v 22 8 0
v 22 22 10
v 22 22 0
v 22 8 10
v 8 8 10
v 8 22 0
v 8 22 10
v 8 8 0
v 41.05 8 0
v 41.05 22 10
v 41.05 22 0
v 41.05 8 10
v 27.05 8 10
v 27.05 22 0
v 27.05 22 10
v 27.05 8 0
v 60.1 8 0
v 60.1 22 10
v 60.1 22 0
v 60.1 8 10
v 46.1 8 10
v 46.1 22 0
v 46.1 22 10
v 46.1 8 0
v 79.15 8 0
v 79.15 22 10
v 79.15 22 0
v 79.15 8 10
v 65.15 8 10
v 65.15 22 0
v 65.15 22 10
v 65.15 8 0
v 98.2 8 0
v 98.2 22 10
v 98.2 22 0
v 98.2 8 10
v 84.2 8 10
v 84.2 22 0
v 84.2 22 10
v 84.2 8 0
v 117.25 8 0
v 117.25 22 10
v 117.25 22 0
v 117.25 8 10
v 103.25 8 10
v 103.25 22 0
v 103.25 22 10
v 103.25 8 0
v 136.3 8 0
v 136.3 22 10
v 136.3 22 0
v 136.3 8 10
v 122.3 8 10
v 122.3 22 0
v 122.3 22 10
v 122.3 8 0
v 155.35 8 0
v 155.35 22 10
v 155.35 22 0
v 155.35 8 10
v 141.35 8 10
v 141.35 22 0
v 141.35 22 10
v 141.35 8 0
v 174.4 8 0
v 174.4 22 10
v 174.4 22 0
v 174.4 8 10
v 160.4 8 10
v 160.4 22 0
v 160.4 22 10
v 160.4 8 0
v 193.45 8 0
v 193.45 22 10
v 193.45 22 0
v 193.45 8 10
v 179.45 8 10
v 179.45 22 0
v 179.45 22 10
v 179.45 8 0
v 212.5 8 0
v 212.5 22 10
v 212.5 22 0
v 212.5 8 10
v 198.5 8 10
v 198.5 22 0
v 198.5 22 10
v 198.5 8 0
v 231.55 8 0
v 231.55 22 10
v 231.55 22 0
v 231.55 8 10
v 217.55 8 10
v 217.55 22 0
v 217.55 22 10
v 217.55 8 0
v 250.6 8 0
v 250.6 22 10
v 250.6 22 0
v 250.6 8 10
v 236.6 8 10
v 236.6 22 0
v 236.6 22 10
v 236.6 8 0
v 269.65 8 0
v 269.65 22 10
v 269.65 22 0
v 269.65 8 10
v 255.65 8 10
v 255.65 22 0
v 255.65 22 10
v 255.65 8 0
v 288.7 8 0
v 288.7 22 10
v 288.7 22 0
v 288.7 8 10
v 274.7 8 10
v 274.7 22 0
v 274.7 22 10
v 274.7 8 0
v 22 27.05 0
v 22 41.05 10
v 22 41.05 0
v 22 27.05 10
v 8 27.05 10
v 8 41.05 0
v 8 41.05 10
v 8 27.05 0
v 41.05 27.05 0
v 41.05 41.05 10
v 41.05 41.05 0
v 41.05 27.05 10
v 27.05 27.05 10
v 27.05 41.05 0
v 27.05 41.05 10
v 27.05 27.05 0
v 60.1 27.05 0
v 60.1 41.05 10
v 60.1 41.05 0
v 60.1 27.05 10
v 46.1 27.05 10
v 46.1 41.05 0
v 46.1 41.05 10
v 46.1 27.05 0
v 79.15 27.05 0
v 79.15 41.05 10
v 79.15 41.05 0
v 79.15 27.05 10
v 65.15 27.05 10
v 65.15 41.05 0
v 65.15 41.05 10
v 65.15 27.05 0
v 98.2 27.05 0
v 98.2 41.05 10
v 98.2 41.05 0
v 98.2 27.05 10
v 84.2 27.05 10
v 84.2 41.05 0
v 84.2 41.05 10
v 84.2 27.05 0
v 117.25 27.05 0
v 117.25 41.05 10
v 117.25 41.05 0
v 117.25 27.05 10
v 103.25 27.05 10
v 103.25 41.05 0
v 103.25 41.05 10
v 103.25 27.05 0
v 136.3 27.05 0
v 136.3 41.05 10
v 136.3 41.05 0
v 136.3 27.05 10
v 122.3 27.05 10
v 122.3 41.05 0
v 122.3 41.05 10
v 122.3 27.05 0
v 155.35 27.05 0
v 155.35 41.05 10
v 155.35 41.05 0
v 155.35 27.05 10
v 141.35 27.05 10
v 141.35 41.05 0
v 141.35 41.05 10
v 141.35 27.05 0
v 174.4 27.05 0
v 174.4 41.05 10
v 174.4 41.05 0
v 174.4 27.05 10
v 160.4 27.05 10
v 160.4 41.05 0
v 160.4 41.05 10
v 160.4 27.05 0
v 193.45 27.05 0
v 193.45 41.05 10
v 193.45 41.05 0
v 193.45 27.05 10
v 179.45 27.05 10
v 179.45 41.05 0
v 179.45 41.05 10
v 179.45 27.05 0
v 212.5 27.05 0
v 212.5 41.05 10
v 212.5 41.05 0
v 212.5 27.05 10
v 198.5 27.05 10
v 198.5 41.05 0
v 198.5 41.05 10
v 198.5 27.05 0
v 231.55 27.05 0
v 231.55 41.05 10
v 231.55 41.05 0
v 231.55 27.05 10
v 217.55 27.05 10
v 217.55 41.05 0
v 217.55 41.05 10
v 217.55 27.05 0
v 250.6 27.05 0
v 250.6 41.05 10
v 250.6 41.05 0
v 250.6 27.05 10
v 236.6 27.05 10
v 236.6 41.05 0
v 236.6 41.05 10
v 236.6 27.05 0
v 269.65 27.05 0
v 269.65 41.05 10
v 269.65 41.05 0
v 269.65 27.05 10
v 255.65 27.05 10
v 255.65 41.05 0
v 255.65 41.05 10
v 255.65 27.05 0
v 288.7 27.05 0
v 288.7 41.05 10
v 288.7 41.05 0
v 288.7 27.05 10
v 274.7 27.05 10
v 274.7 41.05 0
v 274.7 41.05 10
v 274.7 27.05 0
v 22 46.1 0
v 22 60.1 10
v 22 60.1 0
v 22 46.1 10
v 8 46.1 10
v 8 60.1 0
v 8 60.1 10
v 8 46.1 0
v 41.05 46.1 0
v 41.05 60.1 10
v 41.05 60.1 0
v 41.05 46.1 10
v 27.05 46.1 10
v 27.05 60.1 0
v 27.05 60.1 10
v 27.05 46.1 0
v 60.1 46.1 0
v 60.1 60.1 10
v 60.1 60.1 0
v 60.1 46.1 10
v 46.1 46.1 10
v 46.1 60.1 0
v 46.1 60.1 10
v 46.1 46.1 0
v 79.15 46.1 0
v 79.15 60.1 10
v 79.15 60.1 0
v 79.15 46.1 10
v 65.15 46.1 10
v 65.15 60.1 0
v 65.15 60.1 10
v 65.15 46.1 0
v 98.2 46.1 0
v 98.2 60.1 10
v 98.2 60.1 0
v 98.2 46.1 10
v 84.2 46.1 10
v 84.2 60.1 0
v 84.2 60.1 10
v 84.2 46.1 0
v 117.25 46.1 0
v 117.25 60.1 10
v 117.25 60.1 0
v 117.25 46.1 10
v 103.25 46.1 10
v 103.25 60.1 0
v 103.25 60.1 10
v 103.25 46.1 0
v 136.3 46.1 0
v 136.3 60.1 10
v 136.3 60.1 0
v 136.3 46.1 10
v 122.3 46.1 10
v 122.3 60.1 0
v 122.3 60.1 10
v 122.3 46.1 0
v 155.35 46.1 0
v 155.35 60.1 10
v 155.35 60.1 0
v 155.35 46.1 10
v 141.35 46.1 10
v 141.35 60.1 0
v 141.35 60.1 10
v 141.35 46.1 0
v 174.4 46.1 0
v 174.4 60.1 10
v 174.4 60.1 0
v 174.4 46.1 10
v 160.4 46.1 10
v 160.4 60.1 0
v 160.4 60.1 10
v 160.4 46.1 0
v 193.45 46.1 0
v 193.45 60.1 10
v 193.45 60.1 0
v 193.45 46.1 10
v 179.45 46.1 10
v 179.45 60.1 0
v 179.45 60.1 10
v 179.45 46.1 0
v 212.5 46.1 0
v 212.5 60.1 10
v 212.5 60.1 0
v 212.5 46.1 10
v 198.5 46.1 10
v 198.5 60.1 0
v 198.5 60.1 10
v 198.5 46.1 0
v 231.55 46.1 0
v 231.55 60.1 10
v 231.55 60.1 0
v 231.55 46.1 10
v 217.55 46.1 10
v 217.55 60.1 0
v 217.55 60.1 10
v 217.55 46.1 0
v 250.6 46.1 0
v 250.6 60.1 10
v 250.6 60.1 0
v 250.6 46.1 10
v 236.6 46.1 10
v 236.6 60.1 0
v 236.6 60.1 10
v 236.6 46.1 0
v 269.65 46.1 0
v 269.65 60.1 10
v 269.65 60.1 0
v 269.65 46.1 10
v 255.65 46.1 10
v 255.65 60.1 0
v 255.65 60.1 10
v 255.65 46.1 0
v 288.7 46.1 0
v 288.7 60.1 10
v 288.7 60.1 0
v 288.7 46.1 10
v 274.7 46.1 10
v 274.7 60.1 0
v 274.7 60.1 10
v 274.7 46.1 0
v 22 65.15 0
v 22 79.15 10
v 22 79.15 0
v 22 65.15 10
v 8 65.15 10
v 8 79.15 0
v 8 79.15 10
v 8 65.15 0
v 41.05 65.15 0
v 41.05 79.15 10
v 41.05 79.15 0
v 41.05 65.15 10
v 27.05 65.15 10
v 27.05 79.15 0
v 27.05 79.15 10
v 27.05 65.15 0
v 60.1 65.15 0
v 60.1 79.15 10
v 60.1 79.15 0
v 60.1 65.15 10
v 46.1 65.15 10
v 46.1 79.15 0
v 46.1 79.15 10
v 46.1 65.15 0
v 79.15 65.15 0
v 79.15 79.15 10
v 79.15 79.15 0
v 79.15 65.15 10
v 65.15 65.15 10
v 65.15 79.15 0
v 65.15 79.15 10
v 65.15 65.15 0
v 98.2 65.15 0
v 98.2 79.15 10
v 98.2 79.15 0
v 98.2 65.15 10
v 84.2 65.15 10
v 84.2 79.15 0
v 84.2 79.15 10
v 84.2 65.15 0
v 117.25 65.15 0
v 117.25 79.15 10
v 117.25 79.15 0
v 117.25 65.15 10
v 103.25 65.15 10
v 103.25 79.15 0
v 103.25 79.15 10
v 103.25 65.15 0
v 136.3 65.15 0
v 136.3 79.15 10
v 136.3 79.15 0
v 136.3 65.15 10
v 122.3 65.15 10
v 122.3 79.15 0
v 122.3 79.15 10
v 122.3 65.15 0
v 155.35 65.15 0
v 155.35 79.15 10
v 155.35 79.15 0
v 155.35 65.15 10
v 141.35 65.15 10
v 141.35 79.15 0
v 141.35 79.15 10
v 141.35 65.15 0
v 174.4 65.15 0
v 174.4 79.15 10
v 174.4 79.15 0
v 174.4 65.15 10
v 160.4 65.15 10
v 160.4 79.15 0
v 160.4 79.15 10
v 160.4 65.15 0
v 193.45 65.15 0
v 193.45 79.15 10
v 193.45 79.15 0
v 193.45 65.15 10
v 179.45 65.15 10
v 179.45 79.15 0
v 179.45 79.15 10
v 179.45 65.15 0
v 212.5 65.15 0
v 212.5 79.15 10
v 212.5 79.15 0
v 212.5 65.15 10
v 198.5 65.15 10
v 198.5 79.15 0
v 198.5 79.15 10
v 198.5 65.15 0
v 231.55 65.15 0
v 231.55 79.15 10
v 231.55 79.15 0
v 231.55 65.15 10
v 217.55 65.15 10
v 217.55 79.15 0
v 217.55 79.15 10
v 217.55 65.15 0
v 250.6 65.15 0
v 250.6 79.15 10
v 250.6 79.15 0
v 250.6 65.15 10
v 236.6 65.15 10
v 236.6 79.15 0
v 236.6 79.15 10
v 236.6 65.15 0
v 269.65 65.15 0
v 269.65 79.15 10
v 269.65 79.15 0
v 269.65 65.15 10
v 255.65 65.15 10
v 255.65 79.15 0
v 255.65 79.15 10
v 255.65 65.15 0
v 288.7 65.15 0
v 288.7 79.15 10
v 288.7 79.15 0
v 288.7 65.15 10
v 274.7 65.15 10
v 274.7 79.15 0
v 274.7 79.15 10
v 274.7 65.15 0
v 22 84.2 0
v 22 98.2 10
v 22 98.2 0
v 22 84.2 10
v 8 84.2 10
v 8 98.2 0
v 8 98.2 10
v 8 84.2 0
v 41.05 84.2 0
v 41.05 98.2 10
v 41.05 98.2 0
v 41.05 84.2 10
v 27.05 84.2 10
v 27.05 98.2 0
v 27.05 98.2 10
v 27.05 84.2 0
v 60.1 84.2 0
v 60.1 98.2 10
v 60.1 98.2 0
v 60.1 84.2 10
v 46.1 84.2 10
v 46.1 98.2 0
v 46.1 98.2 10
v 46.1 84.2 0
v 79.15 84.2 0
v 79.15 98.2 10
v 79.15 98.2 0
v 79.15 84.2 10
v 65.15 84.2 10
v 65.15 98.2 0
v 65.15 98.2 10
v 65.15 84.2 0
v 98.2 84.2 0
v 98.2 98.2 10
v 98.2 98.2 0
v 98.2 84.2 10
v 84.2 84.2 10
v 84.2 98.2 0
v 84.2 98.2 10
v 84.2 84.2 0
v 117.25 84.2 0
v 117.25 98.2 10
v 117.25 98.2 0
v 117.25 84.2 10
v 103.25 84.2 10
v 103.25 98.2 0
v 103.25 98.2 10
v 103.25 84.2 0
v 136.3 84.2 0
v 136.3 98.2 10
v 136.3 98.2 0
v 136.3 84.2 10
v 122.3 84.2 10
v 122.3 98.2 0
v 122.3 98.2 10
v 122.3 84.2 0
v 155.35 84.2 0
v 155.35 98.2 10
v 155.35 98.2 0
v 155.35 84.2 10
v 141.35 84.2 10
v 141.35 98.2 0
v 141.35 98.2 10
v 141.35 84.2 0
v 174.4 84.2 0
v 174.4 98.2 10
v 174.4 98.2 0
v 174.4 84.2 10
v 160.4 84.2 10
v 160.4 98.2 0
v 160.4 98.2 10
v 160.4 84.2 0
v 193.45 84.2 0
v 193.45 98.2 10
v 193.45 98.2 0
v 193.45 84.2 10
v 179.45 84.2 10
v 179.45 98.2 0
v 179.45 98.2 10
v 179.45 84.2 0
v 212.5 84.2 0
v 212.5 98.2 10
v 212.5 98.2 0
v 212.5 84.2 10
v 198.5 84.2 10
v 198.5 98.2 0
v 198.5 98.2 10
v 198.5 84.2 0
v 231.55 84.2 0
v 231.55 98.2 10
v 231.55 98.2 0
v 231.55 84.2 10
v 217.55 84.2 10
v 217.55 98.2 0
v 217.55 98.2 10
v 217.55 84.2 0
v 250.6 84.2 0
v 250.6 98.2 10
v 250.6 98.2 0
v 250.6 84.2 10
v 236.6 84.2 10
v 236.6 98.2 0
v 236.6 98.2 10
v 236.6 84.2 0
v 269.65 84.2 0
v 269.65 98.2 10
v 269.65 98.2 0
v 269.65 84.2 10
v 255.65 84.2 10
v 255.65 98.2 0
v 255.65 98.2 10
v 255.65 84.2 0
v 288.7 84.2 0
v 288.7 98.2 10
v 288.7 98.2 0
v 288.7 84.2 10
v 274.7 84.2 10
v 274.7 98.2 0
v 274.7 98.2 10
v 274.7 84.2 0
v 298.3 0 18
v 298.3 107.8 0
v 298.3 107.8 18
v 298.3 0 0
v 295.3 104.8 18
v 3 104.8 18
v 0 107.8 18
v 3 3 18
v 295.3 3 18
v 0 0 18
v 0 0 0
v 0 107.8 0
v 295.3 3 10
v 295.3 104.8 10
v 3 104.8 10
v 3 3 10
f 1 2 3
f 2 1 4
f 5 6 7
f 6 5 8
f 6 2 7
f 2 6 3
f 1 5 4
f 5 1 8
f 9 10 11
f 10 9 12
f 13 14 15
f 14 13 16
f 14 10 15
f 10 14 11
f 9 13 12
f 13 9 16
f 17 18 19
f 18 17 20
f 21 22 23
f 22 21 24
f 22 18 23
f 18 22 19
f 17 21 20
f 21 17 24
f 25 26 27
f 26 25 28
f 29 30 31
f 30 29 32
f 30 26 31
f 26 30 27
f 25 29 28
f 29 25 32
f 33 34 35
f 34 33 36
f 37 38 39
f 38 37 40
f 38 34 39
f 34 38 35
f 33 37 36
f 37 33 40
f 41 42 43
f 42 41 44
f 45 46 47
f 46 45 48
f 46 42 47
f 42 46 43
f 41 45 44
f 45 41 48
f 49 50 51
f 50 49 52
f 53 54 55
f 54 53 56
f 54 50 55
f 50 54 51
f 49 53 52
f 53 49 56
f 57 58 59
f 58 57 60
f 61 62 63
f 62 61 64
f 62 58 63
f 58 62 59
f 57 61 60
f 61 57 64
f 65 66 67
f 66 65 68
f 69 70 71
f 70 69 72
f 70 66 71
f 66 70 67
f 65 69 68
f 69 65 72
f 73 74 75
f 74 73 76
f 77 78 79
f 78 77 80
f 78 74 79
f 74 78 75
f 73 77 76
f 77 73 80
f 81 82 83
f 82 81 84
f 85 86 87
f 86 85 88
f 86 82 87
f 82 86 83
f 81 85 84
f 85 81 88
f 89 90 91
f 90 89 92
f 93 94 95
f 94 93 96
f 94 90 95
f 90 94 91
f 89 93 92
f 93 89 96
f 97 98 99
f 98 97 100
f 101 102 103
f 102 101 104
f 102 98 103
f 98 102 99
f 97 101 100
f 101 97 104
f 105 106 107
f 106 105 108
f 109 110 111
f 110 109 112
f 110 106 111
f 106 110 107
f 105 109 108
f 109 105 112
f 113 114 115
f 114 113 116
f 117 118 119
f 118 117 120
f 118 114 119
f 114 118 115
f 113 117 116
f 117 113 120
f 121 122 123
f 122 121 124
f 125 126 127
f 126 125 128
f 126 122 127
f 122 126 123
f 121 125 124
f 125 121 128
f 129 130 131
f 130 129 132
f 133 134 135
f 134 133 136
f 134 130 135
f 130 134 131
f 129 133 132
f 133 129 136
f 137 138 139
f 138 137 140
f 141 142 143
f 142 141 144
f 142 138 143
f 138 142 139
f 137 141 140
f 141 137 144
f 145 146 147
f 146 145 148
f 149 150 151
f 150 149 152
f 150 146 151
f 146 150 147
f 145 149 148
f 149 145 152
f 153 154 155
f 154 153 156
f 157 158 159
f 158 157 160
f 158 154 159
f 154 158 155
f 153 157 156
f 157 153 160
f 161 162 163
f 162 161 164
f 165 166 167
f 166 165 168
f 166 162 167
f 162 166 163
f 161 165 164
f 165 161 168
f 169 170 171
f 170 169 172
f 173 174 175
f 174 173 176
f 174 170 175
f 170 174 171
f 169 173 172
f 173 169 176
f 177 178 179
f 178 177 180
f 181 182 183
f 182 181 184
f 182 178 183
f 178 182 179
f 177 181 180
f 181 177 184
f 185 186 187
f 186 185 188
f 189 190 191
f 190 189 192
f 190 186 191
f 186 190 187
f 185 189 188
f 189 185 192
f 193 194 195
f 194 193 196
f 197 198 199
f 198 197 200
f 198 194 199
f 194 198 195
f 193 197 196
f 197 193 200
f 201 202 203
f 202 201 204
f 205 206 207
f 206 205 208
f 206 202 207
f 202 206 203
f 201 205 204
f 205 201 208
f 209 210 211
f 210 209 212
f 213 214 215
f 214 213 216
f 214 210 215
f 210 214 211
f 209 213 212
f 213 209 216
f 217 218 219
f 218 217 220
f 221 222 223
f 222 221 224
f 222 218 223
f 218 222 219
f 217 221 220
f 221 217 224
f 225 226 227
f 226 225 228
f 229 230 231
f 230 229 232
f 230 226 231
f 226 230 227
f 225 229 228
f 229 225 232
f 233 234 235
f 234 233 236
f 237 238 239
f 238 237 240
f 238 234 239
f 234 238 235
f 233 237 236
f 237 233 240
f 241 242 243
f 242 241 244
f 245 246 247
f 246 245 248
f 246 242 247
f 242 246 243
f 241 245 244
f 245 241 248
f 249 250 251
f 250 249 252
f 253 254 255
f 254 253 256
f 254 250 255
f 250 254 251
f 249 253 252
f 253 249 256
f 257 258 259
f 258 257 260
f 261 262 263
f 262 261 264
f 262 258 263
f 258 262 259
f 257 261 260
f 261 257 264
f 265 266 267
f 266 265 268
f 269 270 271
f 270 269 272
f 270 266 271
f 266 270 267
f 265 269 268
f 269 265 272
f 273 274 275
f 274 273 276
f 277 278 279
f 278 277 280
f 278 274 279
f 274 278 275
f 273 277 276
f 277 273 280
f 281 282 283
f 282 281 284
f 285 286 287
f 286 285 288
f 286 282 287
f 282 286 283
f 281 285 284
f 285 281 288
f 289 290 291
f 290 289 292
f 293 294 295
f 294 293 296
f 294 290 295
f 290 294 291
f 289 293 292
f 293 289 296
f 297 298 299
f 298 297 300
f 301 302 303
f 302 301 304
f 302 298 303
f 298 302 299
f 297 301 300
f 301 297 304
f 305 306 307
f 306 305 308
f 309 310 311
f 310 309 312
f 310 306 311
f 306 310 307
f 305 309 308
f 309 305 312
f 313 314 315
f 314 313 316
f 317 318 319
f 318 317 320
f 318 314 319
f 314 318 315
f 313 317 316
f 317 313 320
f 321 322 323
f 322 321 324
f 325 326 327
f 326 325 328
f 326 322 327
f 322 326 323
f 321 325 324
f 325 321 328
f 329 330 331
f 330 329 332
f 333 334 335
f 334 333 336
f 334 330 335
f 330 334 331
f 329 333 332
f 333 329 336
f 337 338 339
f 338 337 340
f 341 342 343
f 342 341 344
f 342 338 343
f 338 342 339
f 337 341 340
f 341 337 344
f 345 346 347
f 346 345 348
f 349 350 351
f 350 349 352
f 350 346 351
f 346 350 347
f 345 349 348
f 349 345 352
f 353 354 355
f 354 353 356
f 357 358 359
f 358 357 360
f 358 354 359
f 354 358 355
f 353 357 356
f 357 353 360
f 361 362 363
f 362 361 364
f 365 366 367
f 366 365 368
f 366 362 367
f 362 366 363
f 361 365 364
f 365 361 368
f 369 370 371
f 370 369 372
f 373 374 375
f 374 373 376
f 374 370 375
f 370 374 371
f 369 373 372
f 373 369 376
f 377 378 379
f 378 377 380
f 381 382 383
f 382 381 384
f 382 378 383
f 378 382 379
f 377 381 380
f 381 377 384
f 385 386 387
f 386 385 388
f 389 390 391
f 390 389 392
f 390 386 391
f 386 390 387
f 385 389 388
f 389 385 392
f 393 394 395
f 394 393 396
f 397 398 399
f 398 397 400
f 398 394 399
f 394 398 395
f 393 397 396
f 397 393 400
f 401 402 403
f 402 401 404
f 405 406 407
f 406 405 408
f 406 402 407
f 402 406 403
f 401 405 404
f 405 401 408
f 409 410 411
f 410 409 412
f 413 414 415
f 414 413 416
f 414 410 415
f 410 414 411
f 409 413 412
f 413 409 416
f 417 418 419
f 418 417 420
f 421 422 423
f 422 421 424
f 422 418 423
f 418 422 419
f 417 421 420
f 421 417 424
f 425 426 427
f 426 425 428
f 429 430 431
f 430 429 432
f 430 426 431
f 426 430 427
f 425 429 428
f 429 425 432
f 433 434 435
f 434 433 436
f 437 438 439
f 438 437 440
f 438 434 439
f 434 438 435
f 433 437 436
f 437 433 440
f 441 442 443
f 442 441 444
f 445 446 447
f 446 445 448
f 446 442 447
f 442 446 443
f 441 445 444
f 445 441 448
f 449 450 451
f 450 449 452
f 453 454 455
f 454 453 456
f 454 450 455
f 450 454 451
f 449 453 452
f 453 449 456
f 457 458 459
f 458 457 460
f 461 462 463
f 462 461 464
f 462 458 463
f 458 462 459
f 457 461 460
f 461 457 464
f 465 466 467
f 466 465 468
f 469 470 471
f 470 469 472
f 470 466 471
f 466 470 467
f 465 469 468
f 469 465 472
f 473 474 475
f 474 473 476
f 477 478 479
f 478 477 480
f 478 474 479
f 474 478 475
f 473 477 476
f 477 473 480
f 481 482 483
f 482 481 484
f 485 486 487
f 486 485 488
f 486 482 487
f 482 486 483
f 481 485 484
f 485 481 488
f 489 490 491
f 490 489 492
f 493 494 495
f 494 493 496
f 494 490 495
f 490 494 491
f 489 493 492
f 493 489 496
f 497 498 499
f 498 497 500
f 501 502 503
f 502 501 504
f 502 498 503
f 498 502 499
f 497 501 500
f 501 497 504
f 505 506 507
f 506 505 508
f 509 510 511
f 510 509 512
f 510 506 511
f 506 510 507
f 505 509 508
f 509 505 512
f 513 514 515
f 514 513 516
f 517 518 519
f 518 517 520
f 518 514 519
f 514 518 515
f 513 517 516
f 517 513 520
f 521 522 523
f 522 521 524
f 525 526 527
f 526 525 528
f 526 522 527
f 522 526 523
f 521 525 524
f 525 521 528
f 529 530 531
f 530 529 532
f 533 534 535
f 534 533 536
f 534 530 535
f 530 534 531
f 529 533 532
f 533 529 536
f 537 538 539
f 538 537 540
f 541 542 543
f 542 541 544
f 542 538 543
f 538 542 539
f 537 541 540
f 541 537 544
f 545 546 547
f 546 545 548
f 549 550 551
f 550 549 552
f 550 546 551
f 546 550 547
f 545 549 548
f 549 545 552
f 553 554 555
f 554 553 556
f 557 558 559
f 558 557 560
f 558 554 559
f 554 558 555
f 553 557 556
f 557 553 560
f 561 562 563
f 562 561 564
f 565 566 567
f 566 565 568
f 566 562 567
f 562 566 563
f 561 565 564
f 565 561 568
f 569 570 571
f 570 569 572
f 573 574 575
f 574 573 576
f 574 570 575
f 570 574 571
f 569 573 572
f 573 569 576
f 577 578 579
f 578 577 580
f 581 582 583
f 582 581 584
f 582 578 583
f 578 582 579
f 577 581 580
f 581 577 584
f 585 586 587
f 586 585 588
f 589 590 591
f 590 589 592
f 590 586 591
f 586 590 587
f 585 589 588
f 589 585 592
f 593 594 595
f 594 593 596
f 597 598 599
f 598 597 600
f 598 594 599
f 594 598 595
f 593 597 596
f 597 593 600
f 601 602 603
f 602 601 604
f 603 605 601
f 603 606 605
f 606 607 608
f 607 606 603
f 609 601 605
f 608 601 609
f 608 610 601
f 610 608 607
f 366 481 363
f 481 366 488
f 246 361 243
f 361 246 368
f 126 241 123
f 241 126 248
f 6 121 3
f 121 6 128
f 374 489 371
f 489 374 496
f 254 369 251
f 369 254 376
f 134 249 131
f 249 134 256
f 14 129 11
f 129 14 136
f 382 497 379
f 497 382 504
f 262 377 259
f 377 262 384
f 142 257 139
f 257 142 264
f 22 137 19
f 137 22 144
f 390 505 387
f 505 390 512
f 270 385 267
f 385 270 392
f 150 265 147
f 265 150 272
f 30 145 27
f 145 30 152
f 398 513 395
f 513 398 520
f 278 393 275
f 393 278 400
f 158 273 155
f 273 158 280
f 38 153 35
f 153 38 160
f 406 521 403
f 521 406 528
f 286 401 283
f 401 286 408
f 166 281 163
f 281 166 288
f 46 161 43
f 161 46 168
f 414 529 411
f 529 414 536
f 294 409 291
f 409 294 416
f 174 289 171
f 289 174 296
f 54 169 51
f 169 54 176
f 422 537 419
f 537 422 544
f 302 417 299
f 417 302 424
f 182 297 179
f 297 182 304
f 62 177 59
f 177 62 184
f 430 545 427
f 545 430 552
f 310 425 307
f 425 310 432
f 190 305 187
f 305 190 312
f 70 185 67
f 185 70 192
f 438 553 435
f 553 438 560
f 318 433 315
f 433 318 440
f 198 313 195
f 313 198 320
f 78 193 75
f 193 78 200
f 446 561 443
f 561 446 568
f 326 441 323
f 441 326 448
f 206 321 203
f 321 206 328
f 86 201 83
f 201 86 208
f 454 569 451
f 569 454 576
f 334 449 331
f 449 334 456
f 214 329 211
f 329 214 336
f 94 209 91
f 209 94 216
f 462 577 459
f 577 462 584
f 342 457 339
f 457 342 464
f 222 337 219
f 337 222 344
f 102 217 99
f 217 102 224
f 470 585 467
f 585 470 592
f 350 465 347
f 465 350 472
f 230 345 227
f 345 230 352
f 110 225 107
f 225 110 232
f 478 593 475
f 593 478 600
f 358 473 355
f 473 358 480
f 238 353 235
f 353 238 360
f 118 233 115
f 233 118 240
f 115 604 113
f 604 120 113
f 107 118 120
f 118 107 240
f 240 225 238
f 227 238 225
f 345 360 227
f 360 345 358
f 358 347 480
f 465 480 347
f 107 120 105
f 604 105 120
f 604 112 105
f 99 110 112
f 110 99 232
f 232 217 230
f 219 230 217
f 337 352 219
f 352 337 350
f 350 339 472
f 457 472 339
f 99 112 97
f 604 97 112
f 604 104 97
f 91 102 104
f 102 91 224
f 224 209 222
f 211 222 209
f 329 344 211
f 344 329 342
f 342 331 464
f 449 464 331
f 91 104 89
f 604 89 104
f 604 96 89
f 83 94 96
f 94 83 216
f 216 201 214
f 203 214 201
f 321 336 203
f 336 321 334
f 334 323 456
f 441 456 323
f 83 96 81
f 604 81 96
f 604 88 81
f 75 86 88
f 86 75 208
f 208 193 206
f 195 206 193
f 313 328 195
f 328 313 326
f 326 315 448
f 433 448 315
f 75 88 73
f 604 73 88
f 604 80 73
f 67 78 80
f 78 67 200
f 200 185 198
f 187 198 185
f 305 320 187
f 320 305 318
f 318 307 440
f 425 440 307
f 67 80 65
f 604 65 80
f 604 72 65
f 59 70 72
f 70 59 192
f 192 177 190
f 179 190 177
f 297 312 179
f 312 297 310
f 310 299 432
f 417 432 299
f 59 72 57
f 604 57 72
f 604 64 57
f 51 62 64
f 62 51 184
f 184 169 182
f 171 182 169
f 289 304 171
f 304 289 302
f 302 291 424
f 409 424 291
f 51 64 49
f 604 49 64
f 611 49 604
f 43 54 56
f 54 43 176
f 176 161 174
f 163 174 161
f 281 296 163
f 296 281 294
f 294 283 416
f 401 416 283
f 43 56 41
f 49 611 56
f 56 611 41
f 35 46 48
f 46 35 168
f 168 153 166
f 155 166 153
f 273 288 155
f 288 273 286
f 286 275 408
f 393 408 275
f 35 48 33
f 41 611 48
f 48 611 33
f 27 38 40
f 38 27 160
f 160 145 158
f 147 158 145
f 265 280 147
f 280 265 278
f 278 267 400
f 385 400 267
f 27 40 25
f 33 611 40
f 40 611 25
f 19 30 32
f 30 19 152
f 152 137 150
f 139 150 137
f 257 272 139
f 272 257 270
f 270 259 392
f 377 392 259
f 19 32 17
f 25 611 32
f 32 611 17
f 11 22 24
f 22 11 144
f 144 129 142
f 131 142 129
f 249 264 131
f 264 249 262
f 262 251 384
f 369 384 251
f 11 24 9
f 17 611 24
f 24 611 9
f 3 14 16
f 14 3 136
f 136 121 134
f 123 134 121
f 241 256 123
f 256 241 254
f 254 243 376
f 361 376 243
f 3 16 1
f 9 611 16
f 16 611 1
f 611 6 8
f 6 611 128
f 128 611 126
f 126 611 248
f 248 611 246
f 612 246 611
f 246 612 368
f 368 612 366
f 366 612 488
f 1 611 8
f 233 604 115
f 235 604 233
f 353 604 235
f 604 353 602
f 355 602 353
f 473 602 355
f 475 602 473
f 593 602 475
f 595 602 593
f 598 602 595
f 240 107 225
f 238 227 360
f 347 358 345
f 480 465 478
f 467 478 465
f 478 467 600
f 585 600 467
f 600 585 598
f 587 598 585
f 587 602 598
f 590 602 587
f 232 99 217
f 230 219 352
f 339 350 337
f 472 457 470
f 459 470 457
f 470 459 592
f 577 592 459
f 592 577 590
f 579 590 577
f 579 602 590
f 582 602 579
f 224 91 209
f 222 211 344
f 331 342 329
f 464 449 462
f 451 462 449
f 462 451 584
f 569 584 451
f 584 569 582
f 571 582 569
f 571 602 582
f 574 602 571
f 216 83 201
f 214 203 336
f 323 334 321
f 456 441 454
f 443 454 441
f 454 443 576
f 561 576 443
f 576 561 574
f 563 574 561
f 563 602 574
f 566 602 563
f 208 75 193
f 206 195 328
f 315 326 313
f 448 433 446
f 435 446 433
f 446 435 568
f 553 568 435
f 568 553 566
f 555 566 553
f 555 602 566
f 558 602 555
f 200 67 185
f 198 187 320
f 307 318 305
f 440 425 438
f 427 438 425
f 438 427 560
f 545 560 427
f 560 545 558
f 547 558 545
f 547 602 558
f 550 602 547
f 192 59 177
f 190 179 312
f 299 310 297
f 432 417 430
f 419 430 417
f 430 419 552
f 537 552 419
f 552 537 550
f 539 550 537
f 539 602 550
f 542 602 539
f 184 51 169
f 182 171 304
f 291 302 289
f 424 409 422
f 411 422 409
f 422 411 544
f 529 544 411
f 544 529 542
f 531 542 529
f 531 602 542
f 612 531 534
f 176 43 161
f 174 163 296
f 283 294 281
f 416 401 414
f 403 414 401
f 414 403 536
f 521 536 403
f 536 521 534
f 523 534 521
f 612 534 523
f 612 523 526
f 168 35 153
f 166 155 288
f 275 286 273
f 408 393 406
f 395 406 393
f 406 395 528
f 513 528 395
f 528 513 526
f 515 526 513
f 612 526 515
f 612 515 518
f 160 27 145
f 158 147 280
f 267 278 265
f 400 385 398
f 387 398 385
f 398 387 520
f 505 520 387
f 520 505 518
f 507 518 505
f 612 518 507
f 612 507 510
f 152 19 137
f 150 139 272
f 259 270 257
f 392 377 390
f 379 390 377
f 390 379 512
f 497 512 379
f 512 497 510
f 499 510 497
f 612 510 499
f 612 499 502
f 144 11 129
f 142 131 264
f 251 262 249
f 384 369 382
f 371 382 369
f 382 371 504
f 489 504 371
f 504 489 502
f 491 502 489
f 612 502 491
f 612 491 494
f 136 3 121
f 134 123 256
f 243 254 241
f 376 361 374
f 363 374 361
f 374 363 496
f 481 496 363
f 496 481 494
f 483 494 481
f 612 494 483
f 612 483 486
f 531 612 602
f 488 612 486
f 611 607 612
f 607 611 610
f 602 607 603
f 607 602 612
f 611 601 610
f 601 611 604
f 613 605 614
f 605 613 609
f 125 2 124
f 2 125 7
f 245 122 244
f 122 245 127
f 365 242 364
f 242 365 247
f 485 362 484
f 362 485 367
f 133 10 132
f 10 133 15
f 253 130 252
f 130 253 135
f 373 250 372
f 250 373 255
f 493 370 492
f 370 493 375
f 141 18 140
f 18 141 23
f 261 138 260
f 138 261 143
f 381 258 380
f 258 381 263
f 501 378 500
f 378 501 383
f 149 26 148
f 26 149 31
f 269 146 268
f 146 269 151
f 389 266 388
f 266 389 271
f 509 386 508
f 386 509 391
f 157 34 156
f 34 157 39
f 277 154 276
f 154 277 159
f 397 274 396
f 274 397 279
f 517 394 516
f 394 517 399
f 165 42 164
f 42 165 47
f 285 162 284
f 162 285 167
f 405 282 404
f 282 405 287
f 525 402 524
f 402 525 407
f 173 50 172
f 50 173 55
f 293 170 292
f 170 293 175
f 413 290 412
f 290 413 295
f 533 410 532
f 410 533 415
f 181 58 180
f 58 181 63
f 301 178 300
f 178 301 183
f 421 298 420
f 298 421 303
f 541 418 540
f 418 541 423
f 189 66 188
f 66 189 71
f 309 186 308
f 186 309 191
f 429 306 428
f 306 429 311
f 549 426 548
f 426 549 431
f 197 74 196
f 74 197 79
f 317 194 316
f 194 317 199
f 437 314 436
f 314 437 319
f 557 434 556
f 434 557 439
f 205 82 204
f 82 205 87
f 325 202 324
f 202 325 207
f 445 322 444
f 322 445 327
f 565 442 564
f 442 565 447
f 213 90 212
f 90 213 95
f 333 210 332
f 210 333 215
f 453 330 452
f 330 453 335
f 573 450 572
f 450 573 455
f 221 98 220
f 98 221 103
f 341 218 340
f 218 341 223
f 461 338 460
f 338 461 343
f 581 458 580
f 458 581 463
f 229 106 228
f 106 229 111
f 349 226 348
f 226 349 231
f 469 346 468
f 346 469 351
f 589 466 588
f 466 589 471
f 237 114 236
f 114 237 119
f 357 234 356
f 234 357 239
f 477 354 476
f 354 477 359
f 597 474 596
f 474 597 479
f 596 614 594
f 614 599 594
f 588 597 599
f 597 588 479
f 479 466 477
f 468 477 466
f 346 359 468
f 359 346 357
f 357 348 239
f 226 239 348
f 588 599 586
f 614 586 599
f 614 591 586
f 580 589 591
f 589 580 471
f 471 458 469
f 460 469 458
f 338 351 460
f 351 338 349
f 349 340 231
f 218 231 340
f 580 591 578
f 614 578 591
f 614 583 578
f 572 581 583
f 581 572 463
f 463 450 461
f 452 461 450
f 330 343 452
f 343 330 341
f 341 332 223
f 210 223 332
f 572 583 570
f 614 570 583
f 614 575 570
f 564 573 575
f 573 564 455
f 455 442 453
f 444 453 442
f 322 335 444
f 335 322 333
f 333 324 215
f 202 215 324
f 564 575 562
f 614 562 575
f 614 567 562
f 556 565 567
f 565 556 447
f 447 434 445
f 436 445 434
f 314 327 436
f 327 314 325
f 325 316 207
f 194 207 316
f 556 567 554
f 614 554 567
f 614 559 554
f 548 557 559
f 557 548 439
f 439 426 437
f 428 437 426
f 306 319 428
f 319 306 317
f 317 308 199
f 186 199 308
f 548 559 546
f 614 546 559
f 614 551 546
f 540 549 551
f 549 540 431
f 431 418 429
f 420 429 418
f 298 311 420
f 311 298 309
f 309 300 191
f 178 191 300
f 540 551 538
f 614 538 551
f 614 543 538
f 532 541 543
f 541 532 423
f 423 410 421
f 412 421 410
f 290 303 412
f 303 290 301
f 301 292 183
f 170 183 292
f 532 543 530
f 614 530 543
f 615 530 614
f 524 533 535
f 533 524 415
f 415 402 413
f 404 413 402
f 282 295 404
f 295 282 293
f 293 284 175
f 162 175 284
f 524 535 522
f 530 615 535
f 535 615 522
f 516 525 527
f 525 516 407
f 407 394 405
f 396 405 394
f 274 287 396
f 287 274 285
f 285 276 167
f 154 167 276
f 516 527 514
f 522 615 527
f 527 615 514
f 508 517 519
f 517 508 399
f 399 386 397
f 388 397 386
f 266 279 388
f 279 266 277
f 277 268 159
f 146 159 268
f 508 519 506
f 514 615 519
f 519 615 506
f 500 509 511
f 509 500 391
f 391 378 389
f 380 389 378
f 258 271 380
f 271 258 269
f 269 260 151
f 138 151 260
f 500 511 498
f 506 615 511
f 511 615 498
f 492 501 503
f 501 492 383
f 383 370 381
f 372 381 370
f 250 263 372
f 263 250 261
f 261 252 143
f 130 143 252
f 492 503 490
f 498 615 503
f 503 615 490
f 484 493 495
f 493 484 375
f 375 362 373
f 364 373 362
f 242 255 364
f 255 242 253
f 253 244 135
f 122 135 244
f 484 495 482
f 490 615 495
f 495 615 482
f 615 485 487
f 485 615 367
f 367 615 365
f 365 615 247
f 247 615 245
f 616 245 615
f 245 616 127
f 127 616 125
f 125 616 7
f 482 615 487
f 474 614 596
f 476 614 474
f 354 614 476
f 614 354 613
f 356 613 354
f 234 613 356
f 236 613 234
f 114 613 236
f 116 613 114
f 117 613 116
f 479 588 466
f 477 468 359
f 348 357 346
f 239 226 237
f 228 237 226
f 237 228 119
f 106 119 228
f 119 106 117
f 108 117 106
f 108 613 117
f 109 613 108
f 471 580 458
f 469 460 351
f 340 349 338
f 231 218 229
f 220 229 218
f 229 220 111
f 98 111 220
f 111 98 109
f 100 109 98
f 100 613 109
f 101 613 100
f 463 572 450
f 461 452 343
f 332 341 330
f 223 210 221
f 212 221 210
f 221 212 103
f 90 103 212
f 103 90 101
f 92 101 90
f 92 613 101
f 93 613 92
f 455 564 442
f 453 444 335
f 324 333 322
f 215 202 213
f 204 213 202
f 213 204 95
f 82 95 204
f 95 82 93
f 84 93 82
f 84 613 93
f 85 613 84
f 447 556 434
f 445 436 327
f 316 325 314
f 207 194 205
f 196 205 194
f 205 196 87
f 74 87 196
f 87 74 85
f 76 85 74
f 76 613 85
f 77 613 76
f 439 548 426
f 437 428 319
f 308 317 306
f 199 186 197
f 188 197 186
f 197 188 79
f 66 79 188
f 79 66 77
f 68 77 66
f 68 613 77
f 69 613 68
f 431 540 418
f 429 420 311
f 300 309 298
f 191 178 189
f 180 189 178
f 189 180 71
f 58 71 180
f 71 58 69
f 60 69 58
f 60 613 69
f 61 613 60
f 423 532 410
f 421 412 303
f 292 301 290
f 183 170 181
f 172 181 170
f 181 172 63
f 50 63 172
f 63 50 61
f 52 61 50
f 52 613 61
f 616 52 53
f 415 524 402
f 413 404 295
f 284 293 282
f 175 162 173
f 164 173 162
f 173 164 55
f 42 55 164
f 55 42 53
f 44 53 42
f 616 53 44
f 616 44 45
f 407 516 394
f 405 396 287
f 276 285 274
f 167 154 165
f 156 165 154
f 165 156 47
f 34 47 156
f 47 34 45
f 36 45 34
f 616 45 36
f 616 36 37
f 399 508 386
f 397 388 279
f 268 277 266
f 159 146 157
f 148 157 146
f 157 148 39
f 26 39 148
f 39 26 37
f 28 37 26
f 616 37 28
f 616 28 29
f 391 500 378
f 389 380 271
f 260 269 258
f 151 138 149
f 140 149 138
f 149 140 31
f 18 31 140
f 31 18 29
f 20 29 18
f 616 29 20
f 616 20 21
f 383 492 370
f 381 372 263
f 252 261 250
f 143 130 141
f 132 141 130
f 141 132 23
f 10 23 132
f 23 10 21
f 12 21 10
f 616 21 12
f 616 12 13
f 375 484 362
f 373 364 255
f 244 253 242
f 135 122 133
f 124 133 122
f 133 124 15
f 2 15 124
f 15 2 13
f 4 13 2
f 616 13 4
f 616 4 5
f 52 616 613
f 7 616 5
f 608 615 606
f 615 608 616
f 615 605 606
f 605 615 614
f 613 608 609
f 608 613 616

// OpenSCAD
// Generated keyboard case
// Layout: 5x15
// Switch type: Cherry MX
// Optimization: render

// Parameters
case_width = 298.30;
case_height = 107.80;
case_depth = 18.00;
wall_thickness = 3.00;
base_height = 10.00;
switch_cutout_size = 14.00;
key_spacing = 19.05;

module keyboard_case() {
    difference() {
        // Outer shell
        translate([0, 0, 0])
            cube([case_width, case_height, case_depth]);

        // Inner cavity
        translate([wall_thickness, wall_thickness, base_height])
            cube([case_width - 2*wall_thickness, 
                  case_height - 2*wall_thickness, 
                  case_depth - base_height + 1]);

        // Switch cutouts
        translate([wall_thickness + 5 - 0.00, wall_thickness + 5 - 0.00, -1])
            render() switch_plate();
    }
}

module switch_plate() {
    translate([0.00, 0.00, 0])
        cube([switch_cutout_size, switch_cutout_size, base_height + 2]);
    translate([19.05, 0.00, 0])
        cube([switch_cutout_size, switch_cutout_size, base_height + 2]);
    translate([38.10, 0.00, 0])
        cube([switch_cutout_size, switch_cutout_size, base_height + 2]);
    translate([57.15, 0.00, 0])
        cube([switch_cutout_size, switch_cutout_size, base_height + 2]);
    translate([76.20, 0.00, 0])
        cube([switch_cutout_size, switch_cutout_size, base_height + 2]);
    translate([95.25, 0.00, 0])
        cube([switch_cutout_size, switch_cutout_size, base_height + 2]);
    translate([114.30, 0.00, 0])
        cube([switch_cutout_size, switch_cutout_size, base_height + 2]);
    translate([133.35, 0.00, 0])
        cube([switch_cutout_size, switch_cutout_size, base_height + 2]);
    translate([152.40, 0.00, 0])
        cube([switch_cutout_size, switch_cutout_size, base_height + 2]);
    translate([171.45, 0.00, 0])
        cube([switch_cutout_size, switch_cutout_size, base_height + 2]);
    translate([190.50, 0.00, 0])
        cube([switch_cutout_size, switch_cutout_size, base_height + 2]);
    translate([209.55, 0.00, 0])
        cube([switch_cutout_size, switch_cutout_size, base_height + 2]);
    translate([228.60, 0.00, 0])
        cube([switch_cutout_size, switch_cutout_size, base_height + 2]);
    translate([247.65, 0.00, 0])
        cube([switch_cutout_size, switch_cutout_size, base_height + 2]);
    translate([266.70, 0.00, 0])
        cube([switch_cutout_size, switch_cutout_size, base_height + 2]);
    translate([0.00, 19.05, 0])
        cube([switch_cutout_size, switch_cutout_size, base_height + 2]);
    translate([19.05, 19.05, 0])
        cube([switch_cutout_size, switch_cutout_size, base_height + 2]);
    translate([38.10, 19.05, 0])
        cube([switch_cutout_size, switch_cutout_size, base_height + 2]);
    translate([57.15, 19.05, 0])
        cube([switch_cutout_size, switch_cutout_size, base_height + 2]);
    translate([76.20, 19.05, 0])
        cube([switch_cutout_size, switch_cutout_size, base_height + 2]);
    translate([95.25, 19.05, 0])
        cube([switch_cutout_size, switch_cutout_size, base_height + 2]);
    translate([114.30, 19.05, 0])
        cube([switch_cutout_size, switch_cutout_size, base_height + 2]);
    translate([133.35, 19.05, 0])
        cube([switch_cutout_size, switch_cutout_size, base_height + 2]);
    translate([152.40, 19.05, 0])
        cube([switch_cutout_size, switch_cutout_size, base_height + 2]);
    translate([171.45, 19.05, 0])
        cube([switch_cutout_size, switch_cutout_size, base_height + 2]);
    translate([190.50, 19.05, 0])
        cube([switch_cutout_size, switch_cutout_size, base_height + 2]);
    translate([209.55, 19.05, 0])
        cube([switch_cutout_size, switch_cutout_size, base_height + 2]);
    translate([228.60, 19.05, 0])
        cube([switch_cutout_size, switch_cutout_size, base_height + 2]);
    translate([247.65, 19.05, 0])
        cube([switch_cutout_size, switch_cutout_size, base_height + 2]);
    translate([266.70, 19.05, 0])
        cube([switch_cutout_size, switch_cutout_size, base_height + 2]);
    translate([0.00, 38.10, 0])
        cube([switch_cutout_size, switch_cutout_size, base_height + 2]);
    translate([19.05, 38.10, 0])
        cube([switch_cutout_size, switch_cutout_size, base_height + 2]);
    translate([38.10, 38.10, 0])
        cube([switch_cutout_size, switch_cutout_size, base_height + 2]);
    translate([57.15, 38.10, 0])
        cube([switch_cutout_size, switch_cutout_size, base_height + 2]);
    translate([76.20, 38.10, 0])
        cube([switch_cutout_size, switch_cutout_size, base_height + 2]);
    translate([95.25, 38.10, 0])
        cube([switch_cutout_size, switch_cutout_size, base_height + 2]);
    translate([114.30, 38.10, 0])
        cube([switch_cutout_size, switch_cutout_size, base_height + 2]);
    translate([133.35, 38.10, 0])
        cube([switch_cutout_size, switch_cutout_size, base_height + 2]);
    translate([152.40, 38.10, 0])
        cube([switch_cutout_size, switch_cutout_size, base_height + 2]);
    translate([171.45, 38.10, 0])
        cube([switch_cutout_size, switch_cutout_size, base_height + 2]);
    translate([190.50, 38.10, 0])
        cube([switch_cutout_size, switch_cutout_size, base_height + 2]);
    translate([209.55, 38.10, 0])
        cube([switch_cutout_size, switch_cutout_size, base_height + 2]);
    translate([228.60, 38.10, 0])
        cube([switch_cutout_size, switch_cutout_size, base_height + 2]);
    translate([247.65, 38.10, 0])
        cube([switch_cutout_size, switch_cutout_size, base_height + 2]);
    translate([266.70, 38.10, 0])
        cube([switch_cutout_size, switch_cutout_size, base_height + 2]);
    translate([0.00, 57.15, 0])
        cube([switch_cutout_size, switch_cutout_size, base_height + 2]);
    translate([19.05, 57.15, 0])
        cube([switch_cutout_size, switch_cutout_size, base_height + 2]);
    translate([38.10, 57.15, 0])
        cube([switch_cutout_size, switch_cutout_size, base_height + 2]);
    translate([57.15, 57.15, 0])
        cube([switch_cutout_size, switch_cutout_size, base_height + 2]);
    translate([76.20, 57.15, 0])
        cube([switch_cutout_size, switch_cutout_size, base_height + 2]);
    translate([95.25, 57.15, 0])
        cube([switch_cutout_size, switch_cutout_size, base_height + 2]);
    translate([114.30, 57.15, 0])
        cube([switch_cutout_size, switch_cutout_size, base_height + 2]);
    translate([133.35, 57.15, 0])
        cube([switch_cutout_size, switch_cutout_size, base_height + 2]);
    translate([152.40, 57.15, 0])
        cube([switch_cutout_size, switch_cutout_size, base_height + 2]);
    translate([171.45, 57.15, 0])
        cube([switch_cutout_size, switch_cutout_size, base_height + 2]);
    translate([190.50, 57.15, 0])
        cube([switch_cutout_size, switch_cutout_size, base_height + 2]);
    translate([209.55, 57.15, 0])
        cube([switch_cutout_size, switch_cutout_size, base_height + 2]);
    translate([228.60, 57.15, 0])
        cube([switch_cutout_size, switch_cutout_size, base_height + 2]);
    translate([247.65, 57.15, 0])
        cube([switch_cutout_size, switch_cutout_size, base_height + 2]);
    translate([266.70, 57.15, 0])
        cube([switch_cutout_size, switch_cutout_size, base_height + 2]);
    translate([0.00, 76.20, 0])
        cube([switch_cutout_size, switch_cutout_size, base_height + 2]);
    translate([19.05, 76.20, 0])
        cube([switch_cutout_size, switch_cutout_size, base_height + 2]);
    translate([38.10, 76.20, 0])
        cube([switch_cutout_size, switch_cutout_size, base_height + 2]);
    translate([57.15, 76.20, 0])
        cube([switch_cutout_size, switch_cutout_size, base_height + 2]);
    translate([76.20, 76.20, 0])
        cube([switch_cutout_size, switch_cutout_size, base_height + 2]);
    translate([95.25, 76.20, 0])
        cube([switch_cutout_size, switch_cutout_size, base_height + 2]);
    translate([114.30, 76.20, 0])
        cube([switch_cutout_size, switch_cutout_size, base_height + 2]);
    translate([133.35, 76.20, 0])
        cube([switch_cutout_size, switch_cutout_size, base_height + 2]);
    translate([152.40, 76.20, 0])
        cube([switch_cutout_size, switch_cutout_size, base_height + 2]);
    translate([171.45, 76.20, 0])
        cube([switch_cutout_size, switch_cutout_size, base_height + 2]);
    translate([190.50, 76.20, 0])
        cube([switch_cutout_size, switch_cutout_size, base_height + 2]);
    translate([209.55, 76.20, 0])
        cube([switch_cutout_size, switch_cutout_size, base_height + 2]);
    translate([228.60, 76.20, 0])
        cube([switch_cutout_size, switch_cutout_size, base_height + 2]);
    translate([247.65, 76.20, 0])
        cube([switch_cutout_size, switch_cutout_size, base_height + 2]);
    translate([266.70, 76.20, 0])
        cube([switch_cutout_size, switch_cutout_size, base_height + 2]);
}

// Generate the case
keyboard_case();
